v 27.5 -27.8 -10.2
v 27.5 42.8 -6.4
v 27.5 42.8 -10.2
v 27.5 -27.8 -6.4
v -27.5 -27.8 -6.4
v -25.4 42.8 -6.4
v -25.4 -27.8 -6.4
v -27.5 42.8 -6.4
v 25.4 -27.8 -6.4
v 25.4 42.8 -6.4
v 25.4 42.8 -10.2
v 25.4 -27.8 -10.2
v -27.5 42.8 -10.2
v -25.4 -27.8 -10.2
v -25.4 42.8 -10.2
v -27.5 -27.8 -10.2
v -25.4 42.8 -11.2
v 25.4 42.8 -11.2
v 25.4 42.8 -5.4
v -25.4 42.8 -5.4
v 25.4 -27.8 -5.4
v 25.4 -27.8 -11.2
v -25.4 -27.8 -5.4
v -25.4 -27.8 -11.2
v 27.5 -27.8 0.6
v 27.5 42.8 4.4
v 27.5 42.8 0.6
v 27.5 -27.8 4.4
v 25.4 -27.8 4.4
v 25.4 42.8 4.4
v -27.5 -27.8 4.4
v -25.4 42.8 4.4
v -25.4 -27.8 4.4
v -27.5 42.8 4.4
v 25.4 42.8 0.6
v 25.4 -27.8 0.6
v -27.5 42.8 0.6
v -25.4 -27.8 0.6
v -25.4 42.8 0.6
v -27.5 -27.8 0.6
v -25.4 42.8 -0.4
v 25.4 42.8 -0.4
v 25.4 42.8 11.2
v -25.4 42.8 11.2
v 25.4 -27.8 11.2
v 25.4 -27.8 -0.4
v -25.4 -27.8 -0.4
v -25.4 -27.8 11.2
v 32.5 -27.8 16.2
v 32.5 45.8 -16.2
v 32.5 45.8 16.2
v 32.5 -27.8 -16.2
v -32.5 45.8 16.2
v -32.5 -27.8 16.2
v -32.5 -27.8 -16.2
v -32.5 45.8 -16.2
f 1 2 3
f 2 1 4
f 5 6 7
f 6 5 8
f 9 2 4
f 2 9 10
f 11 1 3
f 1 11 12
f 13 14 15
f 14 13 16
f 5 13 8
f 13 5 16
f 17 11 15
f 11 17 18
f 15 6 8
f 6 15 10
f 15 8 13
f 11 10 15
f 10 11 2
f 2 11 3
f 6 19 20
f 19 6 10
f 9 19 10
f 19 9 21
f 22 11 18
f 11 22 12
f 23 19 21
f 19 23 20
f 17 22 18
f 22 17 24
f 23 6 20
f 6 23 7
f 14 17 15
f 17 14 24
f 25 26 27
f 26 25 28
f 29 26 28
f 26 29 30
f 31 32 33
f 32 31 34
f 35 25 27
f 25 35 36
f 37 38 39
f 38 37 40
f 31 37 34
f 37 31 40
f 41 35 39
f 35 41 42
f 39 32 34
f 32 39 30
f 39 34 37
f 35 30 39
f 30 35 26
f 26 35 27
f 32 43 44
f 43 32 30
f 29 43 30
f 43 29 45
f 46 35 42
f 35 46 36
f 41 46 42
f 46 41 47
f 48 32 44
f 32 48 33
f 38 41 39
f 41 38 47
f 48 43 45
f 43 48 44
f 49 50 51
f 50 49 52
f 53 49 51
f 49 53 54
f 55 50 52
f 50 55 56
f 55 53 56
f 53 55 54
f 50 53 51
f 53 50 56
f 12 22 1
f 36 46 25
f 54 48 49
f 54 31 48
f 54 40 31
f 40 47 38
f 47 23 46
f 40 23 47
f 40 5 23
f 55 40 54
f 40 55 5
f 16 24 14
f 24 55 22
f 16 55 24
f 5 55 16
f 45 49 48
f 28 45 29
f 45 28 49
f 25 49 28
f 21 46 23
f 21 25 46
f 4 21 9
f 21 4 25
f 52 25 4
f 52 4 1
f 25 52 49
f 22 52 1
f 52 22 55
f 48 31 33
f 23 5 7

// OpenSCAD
/**
 * pcmcia-card-organizer.scad
 * A PCMCIA card organizer tower.
 *
 * @author Nathan Campos <nathan@innoveworkshop.com>
 */

// For more information about the spec: https://support.dynabook.com/support/viewContentDetail?contentId=108256

// Generation parameters.
nslots2 = 1;      // Number of Type II slots.
nslots3 = 1;      // Number of Type III slots.
spacing = 5;      // Spacing between slots.
expo_depth = 15;  // Depth of card to leave exposed in front.

// PCMCIA card dimensions.
pcmcia_depth = 85.6;     // Overall depth.
pcmcia_width = 55.0;     // Overall width.
pcmcia_cwidth = 50.8;    // Center section width.
pcmcia_cheight2 = 5.8;   // Center section height for Type II.
pcmcia_xcheight3 = 6.8;  // Center section extra height for Type III.
pcmcia_rheight = 3.8;    // Rail guide height.

/**
 * Gets the height of a PCMCIA card depending on its type.
 *
 * @param  type Type of the PCMCIA card. (Can be 2 or 3)
 * @return      Height of the PCMCIA card.
 */
function pcmcia_height(type = 2) =
	(type == 2) ? pcmcia_cheight2 : (pcmcia_rheight + ((pcmcia_cheight2 - pcmcia_rheight) / 2) + pcmcia_xcheight3);

// Calculates the height of the array.
/**
 * Gets the height of a PCMCIA card slot array.
 *
 * @param  type  Type of the PCMCIA card. (Can be 2 or 3)
 * @param  slots Number of slots in the array.
 * @return       Height of the PCMCIA card.
 */
function slot_array_height(type, slots) =
	(spacing + pcmcia_height(type)) * slots;

/**
 * Generates a PCMCIA card slot.
 *
 * @param type Type of the PCMCIA card. (Can be 2 or 3)
 */
module pcmcia_slot(type = 2) {
	// Ensure we have a correct type.
	assert((type >= 2) && (type <= 3));

	union() {
		// Common rail guides for all types.
		cube([pcmcia_width, pcmcia_depth, pcmcia_rheight], center = true);
		cube([pcmcia_cwidth, pcmcia_depth, pcmcia_cheight2], center = true);
	
		// Extra height for Type III cards.
		if (type == 3) {
			translate([0, 0, (pcmcia_xcheight3 + pcmcia_rheight) / 2])
				cube([pcmcia_cwidth, pcmcia_depth, pcmcia_xcheight3], center = true);
		}
	}
}

/**
 * Builds up a slot array.
 *
 * @param type  Type of the PCMCIA card. (Can be 2 or 3)
 * @param slots Number of slots.
 */
module slot_array(type, slots) {
	// Correct the offset for Type III cards.
	function slot_offset(type) =
		(type == 3) ? (pcmcia_xcheight3 - ((pcmcia_cheight2 - pcmcia_rheight) / 2)) / 2 : 0;

	// Calculates the slot position in the array.
	function slot_pos(type, index) =
		((pcmcia_height(type) / 2) + (spacing + (pcmcia_height(type) / 2))) * index;
	
	// Span the slots.
	translate([0, 0, -(slot_array_height(type, slots - 1)) / 2])
	for (i = [0 : (slots - 1)]) {
		translate([0, 0, slot_pos(type, i) - slot_offset(type)])
			pcmcia_slot(type);
	}
}

/**
 * Builds a mixed card type slot array.
 *
 * @param slots2 Number of Type II card slots.
 * @param slots3 Number of Type III card slots.
 */
module mixed_slot_array(slots2, slots3) {
	recenter_offset =
		((slot_array_height(2, slots2) - slot_array_height(3, slots3)) / 2);

	translate([0, 0, recenter_offset])
	union() {
		// Bottom Type II slots.
		translate([0, 0, -slot_array_height(2, slots2) / 2])
			slot_array(type = 2, slots = slots2);
		
		// Top Type III slots.
		translate([0, 0, slot_array_height(3, slots3) / 2])
			slot_array(type = 3, slots = slots3);
	}
}

/**
 * Builds the organizer enclosure.
 *
 * @param exposed  Exposed card depth.
 * @param slots2   Number of Type II card slots.
 * @param slots3   Number of Type III card slots.
 * @param backface Depth of the backface of the enclosure.
 */
module slot_enclosure(exposed, slots2, slots3, backface = 3) {
	h = slot_array_height(2, slots2) + slot_array_height(3, slots3);

	difference() {
		// Outer case.
		translate([0, (exposed / 2) + (backface / 2), 0])
			cube([pcmcia_width + (spacing * 2), pcmcia_depth - exposed + backface, h + spacing], center = true);
		
		// Slots
		color("pink")
			mixed_slot_array(slots2, slots3);
	}
}

// Build up the enclosure.
slot_enclosure(expo_depth, nslots2, nslots3);
